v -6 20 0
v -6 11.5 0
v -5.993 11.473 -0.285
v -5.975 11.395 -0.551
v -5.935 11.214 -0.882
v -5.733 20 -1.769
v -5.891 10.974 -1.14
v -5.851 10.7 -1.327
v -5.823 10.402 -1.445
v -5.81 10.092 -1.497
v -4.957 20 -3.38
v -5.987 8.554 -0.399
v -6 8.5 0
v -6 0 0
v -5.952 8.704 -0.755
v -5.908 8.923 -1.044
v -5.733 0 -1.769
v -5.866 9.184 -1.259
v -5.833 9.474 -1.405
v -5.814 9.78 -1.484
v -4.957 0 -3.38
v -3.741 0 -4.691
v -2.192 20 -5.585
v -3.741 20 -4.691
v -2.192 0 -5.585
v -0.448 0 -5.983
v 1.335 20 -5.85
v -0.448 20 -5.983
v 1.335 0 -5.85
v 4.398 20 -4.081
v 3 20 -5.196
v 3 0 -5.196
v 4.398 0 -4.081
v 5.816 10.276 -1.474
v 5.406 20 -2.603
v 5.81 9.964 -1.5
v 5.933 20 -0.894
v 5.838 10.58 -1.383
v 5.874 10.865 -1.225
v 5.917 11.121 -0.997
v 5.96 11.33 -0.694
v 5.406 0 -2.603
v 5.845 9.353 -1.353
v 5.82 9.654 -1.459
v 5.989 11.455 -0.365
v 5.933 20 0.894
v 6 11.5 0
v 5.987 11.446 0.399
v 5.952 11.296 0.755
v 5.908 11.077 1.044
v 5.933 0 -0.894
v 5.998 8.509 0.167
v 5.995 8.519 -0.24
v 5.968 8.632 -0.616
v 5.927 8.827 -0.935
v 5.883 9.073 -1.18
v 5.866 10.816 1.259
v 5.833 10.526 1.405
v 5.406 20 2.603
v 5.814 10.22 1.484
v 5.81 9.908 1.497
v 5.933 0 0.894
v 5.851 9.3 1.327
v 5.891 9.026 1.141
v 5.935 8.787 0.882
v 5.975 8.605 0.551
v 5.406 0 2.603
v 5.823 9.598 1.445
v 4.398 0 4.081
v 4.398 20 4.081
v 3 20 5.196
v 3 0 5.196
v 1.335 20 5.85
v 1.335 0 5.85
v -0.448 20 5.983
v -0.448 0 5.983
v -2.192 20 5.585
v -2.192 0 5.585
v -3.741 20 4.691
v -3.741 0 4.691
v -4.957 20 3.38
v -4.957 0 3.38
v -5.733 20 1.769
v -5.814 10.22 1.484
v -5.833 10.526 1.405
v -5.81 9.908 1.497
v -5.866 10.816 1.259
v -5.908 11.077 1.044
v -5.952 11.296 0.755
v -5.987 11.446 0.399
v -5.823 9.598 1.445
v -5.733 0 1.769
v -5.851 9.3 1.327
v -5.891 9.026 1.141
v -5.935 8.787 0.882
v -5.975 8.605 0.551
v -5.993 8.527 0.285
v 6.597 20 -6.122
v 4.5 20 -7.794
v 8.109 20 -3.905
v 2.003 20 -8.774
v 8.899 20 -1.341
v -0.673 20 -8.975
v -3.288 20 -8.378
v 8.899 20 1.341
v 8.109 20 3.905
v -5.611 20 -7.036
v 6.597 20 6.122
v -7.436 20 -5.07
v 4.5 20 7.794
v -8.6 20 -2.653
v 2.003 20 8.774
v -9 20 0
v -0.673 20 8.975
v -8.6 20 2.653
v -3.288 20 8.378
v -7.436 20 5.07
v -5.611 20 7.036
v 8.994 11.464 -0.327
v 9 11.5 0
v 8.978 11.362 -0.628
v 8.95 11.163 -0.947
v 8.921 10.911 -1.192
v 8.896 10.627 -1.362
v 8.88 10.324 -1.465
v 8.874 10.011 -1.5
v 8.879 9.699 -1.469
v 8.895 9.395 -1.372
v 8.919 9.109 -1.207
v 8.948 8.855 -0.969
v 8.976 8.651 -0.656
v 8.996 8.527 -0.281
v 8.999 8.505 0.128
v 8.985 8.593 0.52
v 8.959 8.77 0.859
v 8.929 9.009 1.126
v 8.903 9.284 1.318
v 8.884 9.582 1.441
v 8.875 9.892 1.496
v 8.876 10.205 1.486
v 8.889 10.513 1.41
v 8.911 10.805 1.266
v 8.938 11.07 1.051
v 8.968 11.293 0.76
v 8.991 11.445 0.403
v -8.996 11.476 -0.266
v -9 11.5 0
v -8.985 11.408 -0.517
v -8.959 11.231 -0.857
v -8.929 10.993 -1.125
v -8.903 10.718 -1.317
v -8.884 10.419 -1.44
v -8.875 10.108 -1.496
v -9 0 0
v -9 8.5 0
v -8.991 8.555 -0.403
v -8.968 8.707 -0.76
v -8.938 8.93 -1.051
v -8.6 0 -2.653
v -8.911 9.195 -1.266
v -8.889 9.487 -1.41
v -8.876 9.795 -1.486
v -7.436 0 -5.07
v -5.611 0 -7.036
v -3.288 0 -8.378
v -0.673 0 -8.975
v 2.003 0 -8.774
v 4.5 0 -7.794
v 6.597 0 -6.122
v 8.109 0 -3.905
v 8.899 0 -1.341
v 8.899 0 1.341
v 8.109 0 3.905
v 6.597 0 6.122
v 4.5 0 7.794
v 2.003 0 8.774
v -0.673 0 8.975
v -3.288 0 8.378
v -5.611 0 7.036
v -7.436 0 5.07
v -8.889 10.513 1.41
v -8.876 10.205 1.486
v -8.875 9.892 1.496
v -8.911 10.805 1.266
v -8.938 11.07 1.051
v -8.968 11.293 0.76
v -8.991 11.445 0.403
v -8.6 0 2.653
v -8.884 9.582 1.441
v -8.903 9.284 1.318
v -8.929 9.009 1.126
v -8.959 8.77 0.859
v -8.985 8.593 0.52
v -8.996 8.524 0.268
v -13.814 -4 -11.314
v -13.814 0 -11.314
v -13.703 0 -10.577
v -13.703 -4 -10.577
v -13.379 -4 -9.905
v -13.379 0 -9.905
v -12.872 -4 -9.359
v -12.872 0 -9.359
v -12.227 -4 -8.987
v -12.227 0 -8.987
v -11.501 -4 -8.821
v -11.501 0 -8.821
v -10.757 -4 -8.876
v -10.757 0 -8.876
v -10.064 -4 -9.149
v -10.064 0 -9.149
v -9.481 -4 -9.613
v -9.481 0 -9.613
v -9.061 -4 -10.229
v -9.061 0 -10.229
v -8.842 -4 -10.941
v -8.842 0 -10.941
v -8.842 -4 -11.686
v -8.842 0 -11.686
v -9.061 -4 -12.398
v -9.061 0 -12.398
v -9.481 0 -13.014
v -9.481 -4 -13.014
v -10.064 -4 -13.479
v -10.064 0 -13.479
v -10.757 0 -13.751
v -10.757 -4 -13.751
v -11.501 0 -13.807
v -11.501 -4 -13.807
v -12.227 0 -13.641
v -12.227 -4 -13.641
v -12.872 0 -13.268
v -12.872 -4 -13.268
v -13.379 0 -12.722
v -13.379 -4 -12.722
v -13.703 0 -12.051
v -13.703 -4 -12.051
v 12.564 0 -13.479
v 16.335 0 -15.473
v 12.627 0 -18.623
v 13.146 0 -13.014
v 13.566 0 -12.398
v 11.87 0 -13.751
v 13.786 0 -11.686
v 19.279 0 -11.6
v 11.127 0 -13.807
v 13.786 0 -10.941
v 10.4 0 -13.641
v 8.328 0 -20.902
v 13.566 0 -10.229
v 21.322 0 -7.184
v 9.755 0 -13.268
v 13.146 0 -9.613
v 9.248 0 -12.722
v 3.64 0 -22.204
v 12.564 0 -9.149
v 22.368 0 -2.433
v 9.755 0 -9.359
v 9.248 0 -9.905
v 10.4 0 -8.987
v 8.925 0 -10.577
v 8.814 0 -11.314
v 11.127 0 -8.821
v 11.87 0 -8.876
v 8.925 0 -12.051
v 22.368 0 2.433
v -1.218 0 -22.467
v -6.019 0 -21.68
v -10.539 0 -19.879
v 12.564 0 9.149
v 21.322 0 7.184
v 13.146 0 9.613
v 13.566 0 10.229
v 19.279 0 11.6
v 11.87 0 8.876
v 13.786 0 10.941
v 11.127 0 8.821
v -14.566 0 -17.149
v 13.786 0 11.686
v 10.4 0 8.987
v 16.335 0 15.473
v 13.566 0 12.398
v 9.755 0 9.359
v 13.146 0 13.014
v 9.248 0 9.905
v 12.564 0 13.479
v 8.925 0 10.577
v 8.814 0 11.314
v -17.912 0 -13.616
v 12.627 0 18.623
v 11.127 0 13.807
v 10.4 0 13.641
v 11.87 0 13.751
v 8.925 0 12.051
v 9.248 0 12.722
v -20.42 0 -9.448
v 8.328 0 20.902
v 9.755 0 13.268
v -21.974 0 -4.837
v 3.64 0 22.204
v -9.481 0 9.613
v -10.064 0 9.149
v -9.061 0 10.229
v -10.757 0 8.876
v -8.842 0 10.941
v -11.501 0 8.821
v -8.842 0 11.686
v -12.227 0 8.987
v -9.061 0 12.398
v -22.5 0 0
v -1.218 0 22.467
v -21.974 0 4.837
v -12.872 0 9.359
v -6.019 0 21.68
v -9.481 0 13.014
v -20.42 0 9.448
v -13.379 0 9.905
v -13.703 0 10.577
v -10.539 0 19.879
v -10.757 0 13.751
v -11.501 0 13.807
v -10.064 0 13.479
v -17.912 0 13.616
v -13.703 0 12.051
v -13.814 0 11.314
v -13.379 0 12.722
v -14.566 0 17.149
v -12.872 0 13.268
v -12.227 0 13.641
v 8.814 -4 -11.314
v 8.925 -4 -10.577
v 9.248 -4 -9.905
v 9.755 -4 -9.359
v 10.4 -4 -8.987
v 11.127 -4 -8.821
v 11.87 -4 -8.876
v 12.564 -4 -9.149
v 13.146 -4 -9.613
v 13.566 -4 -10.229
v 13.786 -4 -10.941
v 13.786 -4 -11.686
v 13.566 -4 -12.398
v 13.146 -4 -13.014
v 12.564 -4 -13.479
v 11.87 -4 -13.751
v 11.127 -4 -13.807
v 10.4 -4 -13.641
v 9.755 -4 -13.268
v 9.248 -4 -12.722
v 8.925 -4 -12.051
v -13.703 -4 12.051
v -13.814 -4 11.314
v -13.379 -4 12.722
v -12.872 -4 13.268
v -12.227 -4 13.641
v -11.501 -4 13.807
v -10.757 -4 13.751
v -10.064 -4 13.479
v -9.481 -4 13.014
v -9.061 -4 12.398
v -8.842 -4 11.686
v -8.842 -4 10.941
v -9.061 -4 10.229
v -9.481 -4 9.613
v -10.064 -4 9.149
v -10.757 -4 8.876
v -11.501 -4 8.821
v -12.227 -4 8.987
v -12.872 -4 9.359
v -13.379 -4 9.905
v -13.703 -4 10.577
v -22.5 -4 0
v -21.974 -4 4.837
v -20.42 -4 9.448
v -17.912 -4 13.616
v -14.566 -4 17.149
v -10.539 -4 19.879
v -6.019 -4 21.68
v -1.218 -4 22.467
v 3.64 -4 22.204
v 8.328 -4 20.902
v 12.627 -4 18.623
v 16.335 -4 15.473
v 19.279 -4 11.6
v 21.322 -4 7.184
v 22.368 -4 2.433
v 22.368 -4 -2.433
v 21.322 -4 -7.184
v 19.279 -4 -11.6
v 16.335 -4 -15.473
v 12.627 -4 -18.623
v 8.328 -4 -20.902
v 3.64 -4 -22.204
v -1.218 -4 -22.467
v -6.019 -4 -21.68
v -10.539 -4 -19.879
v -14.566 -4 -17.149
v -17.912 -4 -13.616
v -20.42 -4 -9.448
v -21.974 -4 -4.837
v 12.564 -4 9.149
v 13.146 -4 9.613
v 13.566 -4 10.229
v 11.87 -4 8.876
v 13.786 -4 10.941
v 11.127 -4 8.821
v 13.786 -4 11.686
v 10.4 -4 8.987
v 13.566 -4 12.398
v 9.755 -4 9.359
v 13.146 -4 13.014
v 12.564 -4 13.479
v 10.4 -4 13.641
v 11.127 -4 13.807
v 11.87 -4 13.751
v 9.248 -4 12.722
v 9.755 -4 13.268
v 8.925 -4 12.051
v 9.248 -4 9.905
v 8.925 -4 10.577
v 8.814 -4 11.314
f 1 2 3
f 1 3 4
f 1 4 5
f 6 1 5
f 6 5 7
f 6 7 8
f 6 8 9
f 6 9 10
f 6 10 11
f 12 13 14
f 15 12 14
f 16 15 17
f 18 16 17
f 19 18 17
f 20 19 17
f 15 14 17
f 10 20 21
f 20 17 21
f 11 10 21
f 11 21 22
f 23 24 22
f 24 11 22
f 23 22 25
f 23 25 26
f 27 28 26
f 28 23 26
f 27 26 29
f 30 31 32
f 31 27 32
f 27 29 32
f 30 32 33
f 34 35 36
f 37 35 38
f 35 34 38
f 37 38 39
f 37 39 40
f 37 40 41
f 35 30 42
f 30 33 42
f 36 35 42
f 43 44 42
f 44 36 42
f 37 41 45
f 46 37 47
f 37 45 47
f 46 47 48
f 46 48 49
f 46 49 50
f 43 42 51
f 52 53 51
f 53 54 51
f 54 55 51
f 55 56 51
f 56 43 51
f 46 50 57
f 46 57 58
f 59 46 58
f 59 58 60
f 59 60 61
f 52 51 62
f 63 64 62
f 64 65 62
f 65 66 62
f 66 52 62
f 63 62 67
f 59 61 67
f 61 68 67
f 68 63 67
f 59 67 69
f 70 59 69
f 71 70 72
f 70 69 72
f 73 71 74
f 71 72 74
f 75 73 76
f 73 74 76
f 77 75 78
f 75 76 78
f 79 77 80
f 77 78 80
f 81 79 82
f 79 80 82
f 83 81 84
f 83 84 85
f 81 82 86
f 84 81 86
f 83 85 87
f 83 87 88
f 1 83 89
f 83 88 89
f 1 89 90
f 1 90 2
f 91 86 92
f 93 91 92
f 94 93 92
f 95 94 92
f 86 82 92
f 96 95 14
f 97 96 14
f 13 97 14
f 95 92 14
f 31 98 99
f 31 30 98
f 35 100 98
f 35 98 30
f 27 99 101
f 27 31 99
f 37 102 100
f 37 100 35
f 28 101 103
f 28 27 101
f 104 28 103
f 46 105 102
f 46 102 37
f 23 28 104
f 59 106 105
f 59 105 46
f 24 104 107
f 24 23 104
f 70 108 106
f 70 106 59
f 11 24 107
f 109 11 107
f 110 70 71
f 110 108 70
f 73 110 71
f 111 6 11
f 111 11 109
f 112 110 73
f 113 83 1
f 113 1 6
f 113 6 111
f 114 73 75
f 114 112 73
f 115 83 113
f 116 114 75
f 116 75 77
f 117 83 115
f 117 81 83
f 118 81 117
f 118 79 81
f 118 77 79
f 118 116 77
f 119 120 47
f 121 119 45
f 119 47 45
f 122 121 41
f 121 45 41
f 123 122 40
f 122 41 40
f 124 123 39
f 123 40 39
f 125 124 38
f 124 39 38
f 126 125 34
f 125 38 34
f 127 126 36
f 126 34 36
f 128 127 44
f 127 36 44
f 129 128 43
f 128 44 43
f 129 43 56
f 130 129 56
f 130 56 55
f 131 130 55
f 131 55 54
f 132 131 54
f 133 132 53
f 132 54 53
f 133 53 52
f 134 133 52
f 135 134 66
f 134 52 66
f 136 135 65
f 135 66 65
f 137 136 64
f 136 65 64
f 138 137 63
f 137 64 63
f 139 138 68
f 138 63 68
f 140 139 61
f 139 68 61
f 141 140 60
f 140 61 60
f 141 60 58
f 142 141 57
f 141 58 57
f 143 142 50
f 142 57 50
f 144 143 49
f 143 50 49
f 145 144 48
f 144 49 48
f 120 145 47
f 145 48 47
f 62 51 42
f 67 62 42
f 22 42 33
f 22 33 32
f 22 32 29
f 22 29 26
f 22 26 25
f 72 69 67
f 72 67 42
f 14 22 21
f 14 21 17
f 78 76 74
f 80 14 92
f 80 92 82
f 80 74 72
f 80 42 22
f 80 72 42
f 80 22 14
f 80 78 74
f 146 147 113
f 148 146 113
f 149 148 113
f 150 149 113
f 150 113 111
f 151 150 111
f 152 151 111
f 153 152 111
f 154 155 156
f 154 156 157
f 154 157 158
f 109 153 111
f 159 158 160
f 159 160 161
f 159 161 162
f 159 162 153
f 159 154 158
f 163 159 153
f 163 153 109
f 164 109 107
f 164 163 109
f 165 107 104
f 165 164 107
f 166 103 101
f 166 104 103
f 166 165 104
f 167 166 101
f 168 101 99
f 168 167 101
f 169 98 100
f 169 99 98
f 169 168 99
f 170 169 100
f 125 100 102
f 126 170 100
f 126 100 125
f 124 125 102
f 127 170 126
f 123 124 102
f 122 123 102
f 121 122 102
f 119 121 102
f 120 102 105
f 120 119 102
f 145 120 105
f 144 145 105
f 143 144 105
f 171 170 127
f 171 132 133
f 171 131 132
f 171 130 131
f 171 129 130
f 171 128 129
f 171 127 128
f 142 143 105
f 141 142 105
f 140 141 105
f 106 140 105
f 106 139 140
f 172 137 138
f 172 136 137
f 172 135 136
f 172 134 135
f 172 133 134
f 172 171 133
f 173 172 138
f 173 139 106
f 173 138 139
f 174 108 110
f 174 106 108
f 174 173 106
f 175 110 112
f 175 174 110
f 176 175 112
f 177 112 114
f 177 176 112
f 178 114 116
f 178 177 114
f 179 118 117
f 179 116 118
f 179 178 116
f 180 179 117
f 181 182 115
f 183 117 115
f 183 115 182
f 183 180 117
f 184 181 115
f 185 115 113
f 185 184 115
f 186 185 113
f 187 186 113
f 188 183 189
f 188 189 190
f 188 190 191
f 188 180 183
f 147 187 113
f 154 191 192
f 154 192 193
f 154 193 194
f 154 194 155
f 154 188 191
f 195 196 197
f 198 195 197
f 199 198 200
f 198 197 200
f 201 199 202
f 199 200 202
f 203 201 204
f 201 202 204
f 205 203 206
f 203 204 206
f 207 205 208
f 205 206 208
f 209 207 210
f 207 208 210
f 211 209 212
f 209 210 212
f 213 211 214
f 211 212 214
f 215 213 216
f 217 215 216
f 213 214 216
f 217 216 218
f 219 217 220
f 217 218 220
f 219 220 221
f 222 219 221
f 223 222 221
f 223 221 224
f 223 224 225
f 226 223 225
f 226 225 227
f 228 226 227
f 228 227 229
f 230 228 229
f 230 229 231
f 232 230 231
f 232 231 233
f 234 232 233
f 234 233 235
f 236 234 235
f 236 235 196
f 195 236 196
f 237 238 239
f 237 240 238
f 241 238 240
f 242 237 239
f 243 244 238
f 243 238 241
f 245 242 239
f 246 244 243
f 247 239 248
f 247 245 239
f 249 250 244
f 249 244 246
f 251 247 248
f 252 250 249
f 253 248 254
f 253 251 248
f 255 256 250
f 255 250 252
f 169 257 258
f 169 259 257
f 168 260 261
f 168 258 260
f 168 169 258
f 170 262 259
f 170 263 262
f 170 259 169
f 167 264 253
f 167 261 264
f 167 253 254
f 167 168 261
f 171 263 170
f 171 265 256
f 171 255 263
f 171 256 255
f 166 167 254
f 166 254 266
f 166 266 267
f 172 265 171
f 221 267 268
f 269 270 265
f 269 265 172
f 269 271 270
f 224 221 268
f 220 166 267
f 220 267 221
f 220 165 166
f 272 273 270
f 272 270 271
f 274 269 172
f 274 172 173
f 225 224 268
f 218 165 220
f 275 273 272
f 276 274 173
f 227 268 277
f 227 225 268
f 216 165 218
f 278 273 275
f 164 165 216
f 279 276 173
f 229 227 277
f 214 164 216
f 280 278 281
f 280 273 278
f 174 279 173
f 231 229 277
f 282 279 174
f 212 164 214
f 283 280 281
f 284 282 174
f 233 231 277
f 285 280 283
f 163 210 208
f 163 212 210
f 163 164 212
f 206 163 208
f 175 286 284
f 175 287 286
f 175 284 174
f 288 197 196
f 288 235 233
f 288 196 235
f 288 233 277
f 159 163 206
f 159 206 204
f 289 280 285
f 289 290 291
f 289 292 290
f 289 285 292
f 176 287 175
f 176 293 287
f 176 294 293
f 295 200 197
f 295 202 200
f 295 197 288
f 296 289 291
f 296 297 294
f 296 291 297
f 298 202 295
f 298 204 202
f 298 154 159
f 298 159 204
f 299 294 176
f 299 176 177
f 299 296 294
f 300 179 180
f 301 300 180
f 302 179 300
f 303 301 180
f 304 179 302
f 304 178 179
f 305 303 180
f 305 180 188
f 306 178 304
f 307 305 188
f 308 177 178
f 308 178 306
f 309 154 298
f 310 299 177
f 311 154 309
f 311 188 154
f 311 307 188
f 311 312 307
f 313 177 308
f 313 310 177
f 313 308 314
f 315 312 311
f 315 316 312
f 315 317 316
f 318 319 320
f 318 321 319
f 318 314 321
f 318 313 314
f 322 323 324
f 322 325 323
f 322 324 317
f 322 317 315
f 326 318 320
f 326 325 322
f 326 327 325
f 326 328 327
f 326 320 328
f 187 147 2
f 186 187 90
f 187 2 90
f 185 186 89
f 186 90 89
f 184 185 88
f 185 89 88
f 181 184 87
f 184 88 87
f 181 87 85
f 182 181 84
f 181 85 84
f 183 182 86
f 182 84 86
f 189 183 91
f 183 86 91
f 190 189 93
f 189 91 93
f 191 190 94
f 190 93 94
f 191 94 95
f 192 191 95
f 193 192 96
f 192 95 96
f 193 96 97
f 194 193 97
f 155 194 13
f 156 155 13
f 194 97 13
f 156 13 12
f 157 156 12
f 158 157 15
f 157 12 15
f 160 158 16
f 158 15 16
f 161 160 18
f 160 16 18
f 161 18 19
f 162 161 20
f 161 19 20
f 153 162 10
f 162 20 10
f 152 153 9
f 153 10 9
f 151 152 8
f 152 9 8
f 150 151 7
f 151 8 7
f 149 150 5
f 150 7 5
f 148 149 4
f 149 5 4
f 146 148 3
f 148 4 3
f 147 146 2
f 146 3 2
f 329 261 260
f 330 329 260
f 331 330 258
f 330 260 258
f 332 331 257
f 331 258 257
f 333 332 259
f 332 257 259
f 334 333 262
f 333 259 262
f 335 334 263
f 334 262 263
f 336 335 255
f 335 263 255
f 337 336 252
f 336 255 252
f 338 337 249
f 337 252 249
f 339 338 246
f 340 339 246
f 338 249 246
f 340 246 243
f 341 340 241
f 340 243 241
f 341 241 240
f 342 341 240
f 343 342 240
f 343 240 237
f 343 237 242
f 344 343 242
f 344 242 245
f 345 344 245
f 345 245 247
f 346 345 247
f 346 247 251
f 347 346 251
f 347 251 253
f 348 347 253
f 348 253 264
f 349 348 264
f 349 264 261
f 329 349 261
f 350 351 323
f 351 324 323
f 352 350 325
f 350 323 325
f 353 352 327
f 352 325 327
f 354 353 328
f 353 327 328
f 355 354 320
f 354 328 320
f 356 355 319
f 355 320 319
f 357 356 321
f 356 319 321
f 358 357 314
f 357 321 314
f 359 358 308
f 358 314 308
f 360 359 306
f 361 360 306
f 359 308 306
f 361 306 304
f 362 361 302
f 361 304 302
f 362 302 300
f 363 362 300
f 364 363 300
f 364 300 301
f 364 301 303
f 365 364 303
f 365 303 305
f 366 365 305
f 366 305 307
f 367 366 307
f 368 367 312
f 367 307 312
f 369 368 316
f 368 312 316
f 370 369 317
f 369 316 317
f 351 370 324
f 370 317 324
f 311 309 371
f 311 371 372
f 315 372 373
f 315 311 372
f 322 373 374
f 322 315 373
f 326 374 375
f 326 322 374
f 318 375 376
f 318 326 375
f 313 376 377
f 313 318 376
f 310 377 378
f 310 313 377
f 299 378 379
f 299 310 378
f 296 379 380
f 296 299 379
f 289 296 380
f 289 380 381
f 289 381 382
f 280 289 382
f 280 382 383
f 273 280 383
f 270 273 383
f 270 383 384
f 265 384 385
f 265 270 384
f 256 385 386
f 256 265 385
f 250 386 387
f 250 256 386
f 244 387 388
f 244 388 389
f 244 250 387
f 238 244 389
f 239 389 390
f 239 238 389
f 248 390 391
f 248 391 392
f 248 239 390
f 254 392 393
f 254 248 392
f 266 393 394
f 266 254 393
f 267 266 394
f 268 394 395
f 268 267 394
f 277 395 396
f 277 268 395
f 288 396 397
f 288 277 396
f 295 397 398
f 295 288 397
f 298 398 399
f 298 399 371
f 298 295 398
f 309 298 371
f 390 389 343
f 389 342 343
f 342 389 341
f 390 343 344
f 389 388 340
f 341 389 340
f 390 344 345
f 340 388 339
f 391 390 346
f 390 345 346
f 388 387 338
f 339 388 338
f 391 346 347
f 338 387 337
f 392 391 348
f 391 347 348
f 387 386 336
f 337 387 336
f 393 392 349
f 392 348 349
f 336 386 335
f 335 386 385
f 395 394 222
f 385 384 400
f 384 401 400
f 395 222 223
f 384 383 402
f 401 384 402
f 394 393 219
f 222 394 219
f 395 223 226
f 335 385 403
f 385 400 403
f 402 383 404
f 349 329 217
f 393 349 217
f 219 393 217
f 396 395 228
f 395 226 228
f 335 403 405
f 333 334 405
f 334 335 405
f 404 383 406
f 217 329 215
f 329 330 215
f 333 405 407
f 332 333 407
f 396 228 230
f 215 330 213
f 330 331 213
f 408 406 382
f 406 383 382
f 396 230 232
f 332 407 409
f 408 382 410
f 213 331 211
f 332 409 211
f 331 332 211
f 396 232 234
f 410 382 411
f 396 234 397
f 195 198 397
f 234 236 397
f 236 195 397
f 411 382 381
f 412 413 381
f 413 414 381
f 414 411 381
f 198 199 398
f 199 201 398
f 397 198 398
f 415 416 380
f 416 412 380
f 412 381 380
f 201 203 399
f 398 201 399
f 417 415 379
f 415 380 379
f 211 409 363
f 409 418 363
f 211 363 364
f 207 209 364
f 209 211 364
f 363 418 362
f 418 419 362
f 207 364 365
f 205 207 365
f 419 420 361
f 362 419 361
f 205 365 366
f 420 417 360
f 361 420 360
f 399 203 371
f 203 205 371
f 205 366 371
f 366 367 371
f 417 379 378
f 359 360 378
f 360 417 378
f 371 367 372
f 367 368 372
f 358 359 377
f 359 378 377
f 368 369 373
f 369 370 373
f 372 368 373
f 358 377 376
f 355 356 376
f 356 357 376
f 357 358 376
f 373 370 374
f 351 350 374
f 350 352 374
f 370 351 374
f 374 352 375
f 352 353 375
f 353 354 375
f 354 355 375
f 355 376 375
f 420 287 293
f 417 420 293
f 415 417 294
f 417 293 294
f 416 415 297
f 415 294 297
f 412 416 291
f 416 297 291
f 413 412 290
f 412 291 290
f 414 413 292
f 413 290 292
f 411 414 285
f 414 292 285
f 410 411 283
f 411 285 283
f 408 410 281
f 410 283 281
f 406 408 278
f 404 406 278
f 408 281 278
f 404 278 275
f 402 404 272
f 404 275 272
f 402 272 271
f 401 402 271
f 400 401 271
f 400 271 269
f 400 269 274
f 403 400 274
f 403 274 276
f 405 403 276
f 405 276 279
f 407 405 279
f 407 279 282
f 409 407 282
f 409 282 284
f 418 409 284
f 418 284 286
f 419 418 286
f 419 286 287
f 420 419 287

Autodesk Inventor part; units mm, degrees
ref_plane "YZ Plane" through (0, 0, 0) normal (1, 0, 0) x (0, 1, 0)
ref_plane "XZ Plane" through (0, 0, 0) normal (0, 1, 0) x (-1, 0, 0)
ref_plane "XY Plane" through (0, 0, 0) normal (0, 0, 1) x (1, 0, 0)
sketch "Sketch1" plane through (0, 0, 0) normal (0, 1, 0) x (-1, 0, 0)
  circle A0 centre (0, 0) radius 6
  circle A1 centre (0, 0) radius 22.5
  circle A2 centre (0, 0) radius 9
  line L0 (0, 0) -> (11.3137, -11.3137) construction
  line L1 (0, 0) -> (16, 0) construction
  line L2 (0, 0) -> (-11.3137, 11.3137) construction
  circle A3 centre (11.3137, -11.3137) radius 2.5
  circle A4 centre (-11.3137, 11.3137) radius 2.5
  circle A5 centre (11.3137, 11.3137) radius 2.5
  circle A6 centre (-11.3137, -11.3137) radius 2.5
  dimension "d0" = 12
  dimension "d1" = 45
  dimension "d2" = 18
  dimension "d8" = 45
  dimension "d9" = 16
  dimension "d10" = 5
extrude "Extrusion1" add sketch "Sketch1" along normal blind 20 contours A2
extrude "Extrusion2" add sketch "Sketch1" against normal blind 4 contours A0 | A1 | A2
sketch "Sketch2" plane through (0, 0, 0) normal (1, 0, 0) x (0, 1, 0)
  line L0 (0, 0) -> (10, 0) construction
  circle A0 centre (10, 0) radius 1.5
  dimension "d12" = 10
  dimension "d13" = 3
extrude "Extrusion3" cut sketch "Sketch2" along normal mid plane 30
properties part number "12mm Flange"
